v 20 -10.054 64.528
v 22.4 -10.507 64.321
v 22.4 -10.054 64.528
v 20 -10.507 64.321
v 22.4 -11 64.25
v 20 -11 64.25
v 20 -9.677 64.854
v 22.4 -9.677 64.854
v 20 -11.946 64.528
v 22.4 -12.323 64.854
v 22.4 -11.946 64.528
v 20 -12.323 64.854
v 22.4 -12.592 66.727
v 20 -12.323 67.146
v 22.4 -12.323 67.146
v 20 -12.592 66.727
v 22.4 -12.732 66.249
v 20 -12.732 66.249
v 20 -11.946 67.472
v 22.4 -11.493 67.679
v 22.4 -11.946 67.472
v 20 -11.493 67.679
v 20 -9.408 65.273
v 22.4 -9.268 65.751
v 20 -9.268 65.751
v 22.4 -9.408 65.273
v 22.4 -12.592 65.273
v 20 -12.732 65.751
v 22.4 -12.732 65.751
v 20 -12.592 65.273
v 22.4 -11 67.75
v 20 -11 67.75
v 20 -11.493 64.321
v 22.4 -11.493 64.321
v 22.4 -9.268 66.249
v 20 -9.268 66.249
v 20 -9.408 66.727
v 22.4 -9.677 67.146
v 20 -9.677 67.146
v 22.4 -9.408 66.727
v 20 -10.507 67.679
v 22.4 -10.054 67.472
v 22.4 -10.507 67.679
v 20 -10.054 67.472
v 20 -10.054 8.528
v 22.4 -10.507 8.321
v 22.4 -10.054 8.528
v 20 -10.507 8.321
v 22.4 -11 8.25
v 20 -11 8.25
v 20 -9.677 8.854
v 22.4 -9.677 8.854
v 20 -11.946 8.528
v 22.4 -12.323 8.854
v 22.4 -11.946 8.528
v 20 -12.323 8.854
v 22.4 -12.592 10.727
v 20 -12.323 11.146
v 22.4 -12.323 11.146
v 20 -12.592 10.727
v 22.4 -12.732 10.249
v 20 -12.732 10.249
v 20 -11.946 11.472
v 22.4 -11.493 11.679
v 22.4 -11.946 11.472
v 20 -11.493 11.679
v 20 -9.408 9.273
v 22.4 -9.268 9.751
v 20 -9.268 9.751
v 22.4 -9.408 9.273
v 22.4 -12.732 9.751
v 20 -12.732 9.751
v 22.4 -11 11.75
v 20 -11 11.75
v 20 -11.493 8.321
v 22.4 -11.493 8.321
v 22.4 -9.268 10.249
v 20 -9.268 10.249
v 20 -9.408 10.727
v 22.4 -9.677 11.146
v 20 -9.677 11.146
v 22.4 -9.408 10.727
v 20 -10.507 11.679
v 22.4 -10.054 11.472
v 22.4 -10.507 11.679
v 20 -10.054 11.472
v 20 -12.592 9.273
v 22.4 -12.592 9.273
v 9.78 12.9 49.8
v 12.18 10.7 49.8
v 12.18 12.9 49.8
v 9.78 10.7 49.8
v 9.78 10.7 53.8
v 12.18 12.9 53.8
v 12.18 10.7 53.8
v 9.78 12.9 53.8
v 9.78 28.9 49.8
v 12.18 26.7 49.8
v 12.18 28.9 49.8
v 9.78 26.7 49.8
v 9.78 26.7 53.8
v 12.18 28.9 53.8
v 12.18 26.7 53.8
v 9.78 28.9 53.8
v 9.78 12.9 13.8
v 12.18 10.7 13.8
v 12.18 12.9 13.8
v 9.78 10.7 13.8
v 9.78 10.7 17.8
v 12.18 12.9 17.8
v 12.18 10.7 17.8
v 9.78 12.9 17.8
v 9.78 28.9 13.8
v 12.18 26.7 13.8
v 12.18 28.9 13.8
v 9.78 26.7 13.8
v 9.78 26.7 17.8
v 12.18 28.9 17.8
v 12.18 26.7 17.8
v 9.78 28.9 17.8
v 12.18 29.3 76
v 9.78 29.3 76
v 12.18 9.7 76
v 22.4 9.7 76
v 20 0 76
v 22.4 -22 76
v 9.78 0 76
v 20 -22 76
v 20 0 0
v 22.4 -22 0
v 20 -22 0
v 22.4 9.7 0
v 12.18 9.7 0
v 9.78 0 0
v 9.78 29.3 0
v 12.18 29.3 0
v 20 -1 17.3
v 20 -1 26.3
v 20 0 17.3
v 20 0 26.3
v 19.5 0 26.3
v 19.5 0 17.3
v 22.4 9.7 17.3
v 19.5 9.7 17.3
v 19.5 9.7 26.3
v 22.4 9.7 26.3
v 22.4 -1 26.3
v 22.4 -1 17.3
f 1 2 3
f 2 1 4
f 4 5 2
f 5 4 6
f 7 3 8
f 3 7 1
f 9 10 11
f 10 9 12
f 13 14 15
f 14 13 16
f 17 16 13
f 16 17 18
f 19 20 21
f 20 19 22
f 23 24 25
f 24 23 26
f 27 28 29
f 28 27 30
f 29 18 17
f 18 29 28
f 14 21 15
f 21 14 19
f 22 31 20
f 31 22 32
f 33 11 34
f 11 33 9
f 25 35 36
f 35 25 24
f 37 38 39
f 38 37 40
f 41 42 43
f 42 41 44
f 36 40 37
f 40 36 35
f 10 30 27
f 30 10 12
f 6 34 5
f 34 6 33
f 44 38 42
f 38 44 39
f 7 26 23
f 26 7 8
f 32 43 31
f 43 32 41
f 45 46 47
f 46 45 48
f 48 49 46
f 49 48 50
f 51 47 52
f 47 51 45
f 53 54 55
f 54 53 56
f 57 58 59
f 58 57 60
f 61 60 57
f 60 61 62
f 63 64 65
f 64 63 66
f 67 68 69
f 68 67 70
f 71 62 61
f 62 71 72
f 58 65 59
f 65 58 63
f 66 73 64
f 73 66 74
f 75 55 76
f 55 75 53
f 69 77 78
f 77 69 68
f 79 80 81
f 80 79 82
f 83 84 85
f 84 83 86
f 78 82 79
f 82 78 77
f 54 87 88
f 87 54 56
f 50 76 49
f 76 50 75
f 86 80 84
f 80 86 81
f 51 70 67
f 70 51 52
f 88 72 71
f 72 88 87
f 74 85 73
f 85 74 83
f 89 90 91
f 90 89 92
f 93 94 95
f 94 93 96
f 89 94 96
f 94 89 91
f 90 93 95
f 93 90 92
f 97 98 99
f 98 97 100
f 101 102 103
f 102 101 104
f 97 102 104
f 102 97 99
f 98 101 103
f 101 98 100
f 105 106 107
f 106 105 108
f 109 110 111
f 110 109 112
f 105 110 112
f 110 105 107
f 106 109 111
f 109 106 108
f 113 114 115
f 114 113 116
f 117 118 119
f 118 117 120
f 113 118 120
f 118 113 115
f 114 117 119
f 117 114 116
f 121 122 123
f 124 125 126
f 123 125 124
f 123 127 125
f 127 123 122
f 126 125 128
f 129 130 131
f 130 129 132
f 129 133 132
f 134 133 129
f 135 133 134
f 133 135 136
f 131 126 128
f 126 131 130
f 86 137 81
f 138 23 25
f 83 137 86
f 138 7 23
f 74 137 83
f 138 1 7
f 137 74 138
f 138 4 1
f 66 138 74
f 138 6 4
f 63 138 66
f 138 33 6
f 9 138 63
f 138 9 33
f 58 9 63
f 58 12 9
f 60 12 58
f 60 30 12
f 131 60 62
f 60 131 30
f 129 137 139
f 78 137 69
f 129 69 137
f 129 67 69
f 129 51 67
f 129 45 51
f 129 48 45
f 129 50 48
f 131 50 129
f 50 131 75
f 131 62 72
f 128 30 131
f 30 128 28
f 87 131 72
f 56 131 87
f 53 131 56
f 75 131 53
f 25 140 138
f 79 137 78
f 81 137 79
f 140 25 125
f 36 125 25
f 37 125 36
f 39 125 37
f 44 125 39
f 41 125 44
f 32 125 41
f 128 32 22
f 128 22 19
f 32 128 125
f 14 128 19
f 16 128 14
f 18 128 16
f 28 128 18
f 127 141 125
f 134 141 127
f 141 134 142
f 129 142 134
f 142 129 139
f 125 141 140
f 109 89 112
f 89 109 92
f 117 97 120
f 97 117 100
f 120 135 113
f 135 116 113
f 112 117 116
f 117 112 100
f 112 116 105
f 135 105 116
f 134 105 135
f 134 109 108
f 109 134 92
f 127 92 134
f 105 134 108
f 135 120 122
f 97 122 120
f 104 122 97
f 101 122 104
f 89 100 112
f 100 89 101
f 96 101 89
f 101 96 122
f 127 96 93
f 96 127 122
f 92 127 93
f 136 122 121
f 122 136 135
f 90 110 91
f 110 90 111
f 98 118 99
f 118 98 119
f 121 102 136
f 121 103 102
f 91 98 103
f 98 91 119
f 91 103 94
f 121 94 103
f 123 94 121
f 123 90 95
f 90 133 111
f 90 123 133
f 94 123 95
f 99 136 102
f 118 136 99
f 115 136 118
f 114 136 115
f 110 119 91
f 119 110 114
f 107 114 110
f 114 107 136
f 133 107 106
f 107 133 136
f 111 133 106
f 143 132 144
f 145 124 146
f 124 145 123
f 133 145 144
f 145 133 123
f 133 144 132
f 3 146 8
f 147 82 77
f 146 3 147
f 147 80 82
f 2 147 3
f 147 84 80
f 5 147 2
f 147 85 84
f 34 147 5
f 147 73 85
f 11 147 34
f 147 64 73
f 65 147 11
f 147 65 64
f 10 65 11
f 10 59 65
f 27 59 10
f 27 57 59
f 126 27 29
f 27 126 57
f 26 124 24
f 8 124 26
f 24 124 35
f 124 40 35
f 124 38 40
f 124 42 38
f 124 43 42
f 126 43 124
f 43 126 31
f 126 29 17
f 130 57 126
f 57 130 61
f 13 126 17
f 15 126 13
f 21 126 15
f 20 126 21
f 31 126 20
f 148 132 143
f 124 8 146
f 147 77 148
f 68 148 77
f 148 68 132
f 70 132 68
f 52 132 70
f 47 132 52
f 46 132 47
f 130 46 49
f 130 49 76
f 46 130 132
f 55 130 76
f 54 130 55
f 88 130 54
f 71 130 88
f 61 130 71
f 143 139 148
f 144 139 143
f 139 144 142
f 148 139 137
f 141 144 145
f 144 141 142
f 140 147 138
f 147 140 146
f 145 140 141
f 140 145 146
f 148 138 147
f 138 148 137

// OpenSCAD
// file: ../common/dimensions.scad
// Medidas compartilhadas da DonaTelos, em milímetros.
//
// Cada número diz de onde veio. Sem fonte, leva "a medir" ou "chute" — e
// vira medida de paquímetro assim que a peça chegar.

// ---------------------------------------------------------------- Impressora

// Mesa da mini do dono da impressora (informado em 13/11/2026)
bed_size = 180;
// Altura máxima de impressão — a confirmar com o dono da impressora
bed_height = 180; // a medir

// ---------------------------------------------------------------- Folgas

// Folga de encaixe entre peças — chute; calibrar com uma peça de teste
fit_clearance = 0.3;
// Folga do furo do eixo na roda de pá — chute; o eixo deve entrar justo
shaft_clearance = 0.15;

// ---------------------------------------------------------------- Motor TT

// Fonte: desenho do fabricante na página do motor TT 1:48 da Adafruit
// (produto 3777). Conferir com paquímetro quando o motor chegar.
tt_gearbox_length = 37.0; // caixa amarela, sem a orelha
tt_tab_length = 4.8; // orelha de fixação na ponta da caixa
tt_total_length = 70.0; // do fundo do motor até a ponta da orelha
tt_height = 22.44; // altura da caixa (perpendicular ao eixo)
tt_thickness = 18.6; // espessura da caixa (ao longo do eixo)
tt_can_height = 22.4; // motor prateado, mesma direção da altura
tt_can_thickness = 19.0; // motor prateado, mesma direção da espessura
tt_shaft_from_end = 14.0; // centro do eixo até a ponta da caixa (sem orelha)
tt_shaft_diameter = 5.4; // eixo, no redondo
tt_shaft_flat = 3.7; // eixo, entre as duas faces planas
tt_shaft_length = 8.7; // quanto o eixo sai da caixa (o lado mais curto)
tt_shaft_length_long = 9.3; // o outro lado do eixo duplo
tt_hole_diameter = 3.0; // furo de fixação

// ---------------------------------------------------------------- Roda de pá

// Igual nos dois caminhos do casco
wheel_radius = 28; // chute — afinar no teste da bacia (quanto a pá molha)
wheel_width = 16; // largura da pá, ao longo do eixo

// ---------------------------------------------------------------- Eletrônica

// Célula 18650 GoldHill — página da loja: Ø18 x 65 mm
cell_diameter = 18;
cell_length = 65;
// Suporte de 1 célula — chute; medir quando chegar
holder_length = 77; // a medir
holder_width = 21; // a medir
holder_height = 19; // a medir
// Placa fenolite 5x7 cm — página da loja
board_length = 70;
board_width = 50;
board_thickness = 1.6; // chute — fenolite comum
board_hole_inset = 2.5; // a medir — furo do canto até a borda
// Altura das peças em cima da placa (ESP, ponte H, bornes) — chute
board_parts_height = 15; // a medir
// Chave gangorra KCD11 — recorte no painel
switch_cutout_length = 19; // a medir
switch_cutout_width = 13; // a medir
// file: pot_params.scad
// Medidas do caminho A (pote e isopor), compartilhadas entre o suporte do
// motor, a carapaça, o molde do isopor e a vista do conjunto.
//
// O pote é o da foto em docs/imagens/foto-pote.jpeg: as medidas dele são
// chute pela foto — trocar pelas da régua.

include <../common/dimensions.scad>

// ---------------------------------------------------------------- Pote

pot_length = 155; // chute pela foto — a medir
pot_width = 110; // chute pela foto — a medir
pot_height = 55; // corpo, sem a tampa — chute pela foto, a medir
pot_corner_radius = 15; // chute
pot_taper = 1.06; // a boca é um pouco maior que o fundo — chute
pot_wall = 1.2; // chute
lid_height = 8; // chute
lid_overhang = 4; // a aba da tampa passa da boca — chute

// ---------------------------------------------------------------- Isopor

raft_length = 230; // chute — depende da placa de isopor que aparecer
raft_width = 170; // chute
raft_thickness = 20; // a medir — placa comum de isopor
// Superelipse: forma de casco, com a lateral quase reta onde o suporte do
// motor encosta
raft_shape_n = 3.5;

// O pote encaixa num furo do isopor, com o fundo rente ao fundo do isopor.
// O furo tem a medida do pote na altura do topo do isopor: pela conicidade,
// o pote entra apertado.
pot_hole_clearance = 1;

// ---------------------------------------------------------------- Motores

// Suporte impresso na borda do isopor, de cada lado, no meio do comprimento
shaft_x = 0;
mount_clearance = 0.6;
mount_wall = 2.4;
mount_flange_length = 22; // aba que deita em cima do isopor
shaft_above_raft = 4; // o eixo fica um pouco acima do topo do isopor

// Meia-largura do isopor no meio do comprimento é raft_width / 2
raft_edge_y = raft_width / 2;
shaft_z = raft_thickness + shaft_above_raft;
// Face de dentro do motor: o eixo de dentro não encosta no isopor
motor_inner_y = raft_edge_y + 1 + tt_shaft_length_long;
motor_center_y = motor_inner_y + max(tt_thickness, tt_can_thickness) / 2;
gearbox_outer_y = motor_center_y + tt_thickness / 2;
wheel_inner_y = gearbox_outer_y + 1;

// ---------------------------------------------------------------- Carapaça

// Vai colada em cima da tampa do pote: abriu a tampa, abriu a tartaruga.
// O ar preso entre ela e a tampa é o que faz o barco desvirar.
shell_length = 176; // cabe na mesa de 18 cm
shell_width = 146;
shell_height = 34;
shell_shape_n = 3.5; // superelipse: cobre os cantos da tampa retangular
shell_thickness = 2.0; // chute
shell_base = 2.0; // anel da base, que cola na tampa
shell_opening_margin = 10; // o anel entra isso pra dentro da borda da tampa
scute_size = 22;
scute_ridge_width = 1.6;
scute_ridge_height = 1.2;

// ---------------------------------------------------------------- Água

// Linha d'água — estimativa: barco de ~310 g (impresso ~100 g, pote e tampa
// ~50 g de chute, isopor, uma célula, motores e placa) desloca isso com
// ~9 mm afundados, pelo volume do isopor e do pote no modelo. Sem a
// carapaça (Fase 1), ~7 mm. A bacia confirma.
waterline_z = 9; // estimativa
// main file
// Suporte do motor no caminho A — prende o motor TT na borda do isopor.
//
// Uma aba deita em cima do isopor (presa com palito de churrasco espetado e
// um pouco de cola), um bloco encosta na lateral e uma bandeja segura o motor
// pra fora da borda, com o eixo apontando pra fora. Duas abraçadeiras
// passam pela bandeja e abraçam o motor.
//
// O perfil é igual ao longo do comprimento: imprime em pé, deitado numa das
// pontas, sem suporte. São duas peças iguais — a do outro lado é a mesma,
// girada.

include <pot_params.scad>

$fa = 4;
$fs = 0.5;

// ---------------------------------------------------------------- Peça

// Em pé, numa das pontas, pronto pra fatiar. As medidas vêm do motor
// (common/dimensions.scad) e do caminho A (pot_params.scad)
rotate([0, 90, 0])
    translate([-mount_x_max(tt_shaft_from_end, tt_tab_length,
                            mount_clearance, mount_wall), 0, 0])
        motor_mount(
            motor_length = tt_total_length,
            shaft_from_end = tt_shaft_from_end,
            tab_length = tt_tab_length,
            motor_width = max(tt_thickness, tt_can_thickness),
            motor_height = tt_height,
            raft_thickness = raft_thickness,
            shaft_z = shaft_z,
            inner_y = motor_inner_y - raft_edge_y,
            clearance = mount_clearance,
            wall = mount_wall,
            flange_length = mount_flange_length
        );

// ---------------------------------------------------------------- Funções

// Ponta da frente do suporte, do lado da orelha do motor: x em mm, com o 0
// no eixo. Os parâmetros são os de motor_mount.
function mount_x_max(shaft_from_end, tab_length, clearance, wall) =
    shaft_from_end + tab_length + clearance + wall;

// Ponta de trás do suporte, do lado do fundo do motor: x em mm, com o 0 no
// eixo. Os parâmetros são os de motor_mount.
function mount_x_min(motor_length, shaft_from_end, tab_length, clearance,
                     wall) =
    -(motor_length - shaft_from_end - tab_length) - clearance - wall;

// ---------------------------------------------------------------- Módulos

// Suporte do motor, na posição de uso: x ao longo do motor (0 no eixo), y pra
// fora da borda do isopor (0 na borda), z pra cima (0 no fundo do isopor).
//   motor_length       motor TT inteiro, do fundo à ponta da orelha (mm)
//   shaft_from_end     centro do eixo até a ponta da caixa, sem a orelha (mm)
//   tab_length         orelha de fixação na ponta da caixa (mm)
//   motor_width        espessura do motor, a maior entre caixa e motor (mm)
//   motor_height       altura da caixa, perpendicular ao eixo (mm)
//   raft_thickness     espessura do isopor (mm)
//   shaft_z            altura do eixo, a partir do fundo do isopor (mm)
//   inner_y            face de dentro do motor, a partir da borda (mm)
//   clearance          folga em volta do motor (mm)
//   wall               espessura das paredes (mm)
//   flange_length      aba que deita em cima do isopor (mm)
//   peg_hole_diameter  furo do palito de churrasco (mm)
//   strap_x_positions  onde passam as abraçadeiras, em x (mm)
//   strap_slot         rasgo da abraçadeira, [largura, espessura] (mm) —
//                      abraçadeira pequena, a medir
module motor_mount(motor_length, shaft_from_end, tab_length, motor_width,
                   motor_height, raft_thickness, shaft_z, inner_y, clearance,
                   wall, flange_length, peg_hole_diameter = 3.5,
                   strap_x_positions = [-30, 6], strap_slot = [4, 2.2]) {
    x_min = mount_x_min(motor_length, shaft_from_end, tab_length, clearance,
                        wall);
    x_max = mount_x_max(shaft_from_end, tab_length, clearance, wall);
    tray_bottom = shaft_z - motor_height / 2 - clearance - wall;
    difference() {
        translate([x_min, 0, 0])
            rotate([90, 0, 90])
                linear_extrude(height = x_max - x_min)
                    mount_profile(raft_thickness, inner_y, motor_width,
                                  tray_bottom, clearance, wall,
                                  flange_length);
        // Rasgo do eixo de dentro, aberto em cima pro motor descer
        translate([-4.5, -1, shaft_z - 4.5])
            cube([9, inner_y + 1.1, 2 * raft_thickness]);
        // Furos dos palitos que espetam no isopor
        for (x = [x_min + 10, x_max - 10])
            translate([x, -flange_length / 2, 0])
                cylinder(d = peg_hole_diameter, h = 2 * raft_thickness);
        // Rasgos das abraçadeiras: um de cada lado do motor
        for (x = strap_x_positions, y = [inner_y + 1.5,
                                         inner_y + motor_width - 1.5])
            translate([x - strap_slot[0] / 2, y - strap_slot[1] / 2,
                       tray_bottom - 1])
                cube([strap_slot[0], strap_slot[1], wall + 2]);
    }
}

// Perfil do suporte, em 2D (y, z): aba no topo do isopor, bloco na lateral e
// bandeja embaixo.
//   tray_bottom  altura da face de baixo da bandeja (mm)
//   os outros    os de motor_mount
module mount_profile(raft_thickness, inner_y, motor_width, tray_bottom,
                     clearance, wall, flange_length) {
    top = raft_thickness + wall;
    // Aba em cima do isopor
    translate([-flange_length, raft_thickness])
        square([flange_length + inner_y - clearance, wall]);
    // Bloco que encosta na lateral do isopor
    translate([0, tray_bottom])
        square([inner_y - clearance, top - tray_bottom]);
    // Bandeja do motor
    translate([0, tray_bottom])
        square([inner_y + motor_width, wall]);
}
